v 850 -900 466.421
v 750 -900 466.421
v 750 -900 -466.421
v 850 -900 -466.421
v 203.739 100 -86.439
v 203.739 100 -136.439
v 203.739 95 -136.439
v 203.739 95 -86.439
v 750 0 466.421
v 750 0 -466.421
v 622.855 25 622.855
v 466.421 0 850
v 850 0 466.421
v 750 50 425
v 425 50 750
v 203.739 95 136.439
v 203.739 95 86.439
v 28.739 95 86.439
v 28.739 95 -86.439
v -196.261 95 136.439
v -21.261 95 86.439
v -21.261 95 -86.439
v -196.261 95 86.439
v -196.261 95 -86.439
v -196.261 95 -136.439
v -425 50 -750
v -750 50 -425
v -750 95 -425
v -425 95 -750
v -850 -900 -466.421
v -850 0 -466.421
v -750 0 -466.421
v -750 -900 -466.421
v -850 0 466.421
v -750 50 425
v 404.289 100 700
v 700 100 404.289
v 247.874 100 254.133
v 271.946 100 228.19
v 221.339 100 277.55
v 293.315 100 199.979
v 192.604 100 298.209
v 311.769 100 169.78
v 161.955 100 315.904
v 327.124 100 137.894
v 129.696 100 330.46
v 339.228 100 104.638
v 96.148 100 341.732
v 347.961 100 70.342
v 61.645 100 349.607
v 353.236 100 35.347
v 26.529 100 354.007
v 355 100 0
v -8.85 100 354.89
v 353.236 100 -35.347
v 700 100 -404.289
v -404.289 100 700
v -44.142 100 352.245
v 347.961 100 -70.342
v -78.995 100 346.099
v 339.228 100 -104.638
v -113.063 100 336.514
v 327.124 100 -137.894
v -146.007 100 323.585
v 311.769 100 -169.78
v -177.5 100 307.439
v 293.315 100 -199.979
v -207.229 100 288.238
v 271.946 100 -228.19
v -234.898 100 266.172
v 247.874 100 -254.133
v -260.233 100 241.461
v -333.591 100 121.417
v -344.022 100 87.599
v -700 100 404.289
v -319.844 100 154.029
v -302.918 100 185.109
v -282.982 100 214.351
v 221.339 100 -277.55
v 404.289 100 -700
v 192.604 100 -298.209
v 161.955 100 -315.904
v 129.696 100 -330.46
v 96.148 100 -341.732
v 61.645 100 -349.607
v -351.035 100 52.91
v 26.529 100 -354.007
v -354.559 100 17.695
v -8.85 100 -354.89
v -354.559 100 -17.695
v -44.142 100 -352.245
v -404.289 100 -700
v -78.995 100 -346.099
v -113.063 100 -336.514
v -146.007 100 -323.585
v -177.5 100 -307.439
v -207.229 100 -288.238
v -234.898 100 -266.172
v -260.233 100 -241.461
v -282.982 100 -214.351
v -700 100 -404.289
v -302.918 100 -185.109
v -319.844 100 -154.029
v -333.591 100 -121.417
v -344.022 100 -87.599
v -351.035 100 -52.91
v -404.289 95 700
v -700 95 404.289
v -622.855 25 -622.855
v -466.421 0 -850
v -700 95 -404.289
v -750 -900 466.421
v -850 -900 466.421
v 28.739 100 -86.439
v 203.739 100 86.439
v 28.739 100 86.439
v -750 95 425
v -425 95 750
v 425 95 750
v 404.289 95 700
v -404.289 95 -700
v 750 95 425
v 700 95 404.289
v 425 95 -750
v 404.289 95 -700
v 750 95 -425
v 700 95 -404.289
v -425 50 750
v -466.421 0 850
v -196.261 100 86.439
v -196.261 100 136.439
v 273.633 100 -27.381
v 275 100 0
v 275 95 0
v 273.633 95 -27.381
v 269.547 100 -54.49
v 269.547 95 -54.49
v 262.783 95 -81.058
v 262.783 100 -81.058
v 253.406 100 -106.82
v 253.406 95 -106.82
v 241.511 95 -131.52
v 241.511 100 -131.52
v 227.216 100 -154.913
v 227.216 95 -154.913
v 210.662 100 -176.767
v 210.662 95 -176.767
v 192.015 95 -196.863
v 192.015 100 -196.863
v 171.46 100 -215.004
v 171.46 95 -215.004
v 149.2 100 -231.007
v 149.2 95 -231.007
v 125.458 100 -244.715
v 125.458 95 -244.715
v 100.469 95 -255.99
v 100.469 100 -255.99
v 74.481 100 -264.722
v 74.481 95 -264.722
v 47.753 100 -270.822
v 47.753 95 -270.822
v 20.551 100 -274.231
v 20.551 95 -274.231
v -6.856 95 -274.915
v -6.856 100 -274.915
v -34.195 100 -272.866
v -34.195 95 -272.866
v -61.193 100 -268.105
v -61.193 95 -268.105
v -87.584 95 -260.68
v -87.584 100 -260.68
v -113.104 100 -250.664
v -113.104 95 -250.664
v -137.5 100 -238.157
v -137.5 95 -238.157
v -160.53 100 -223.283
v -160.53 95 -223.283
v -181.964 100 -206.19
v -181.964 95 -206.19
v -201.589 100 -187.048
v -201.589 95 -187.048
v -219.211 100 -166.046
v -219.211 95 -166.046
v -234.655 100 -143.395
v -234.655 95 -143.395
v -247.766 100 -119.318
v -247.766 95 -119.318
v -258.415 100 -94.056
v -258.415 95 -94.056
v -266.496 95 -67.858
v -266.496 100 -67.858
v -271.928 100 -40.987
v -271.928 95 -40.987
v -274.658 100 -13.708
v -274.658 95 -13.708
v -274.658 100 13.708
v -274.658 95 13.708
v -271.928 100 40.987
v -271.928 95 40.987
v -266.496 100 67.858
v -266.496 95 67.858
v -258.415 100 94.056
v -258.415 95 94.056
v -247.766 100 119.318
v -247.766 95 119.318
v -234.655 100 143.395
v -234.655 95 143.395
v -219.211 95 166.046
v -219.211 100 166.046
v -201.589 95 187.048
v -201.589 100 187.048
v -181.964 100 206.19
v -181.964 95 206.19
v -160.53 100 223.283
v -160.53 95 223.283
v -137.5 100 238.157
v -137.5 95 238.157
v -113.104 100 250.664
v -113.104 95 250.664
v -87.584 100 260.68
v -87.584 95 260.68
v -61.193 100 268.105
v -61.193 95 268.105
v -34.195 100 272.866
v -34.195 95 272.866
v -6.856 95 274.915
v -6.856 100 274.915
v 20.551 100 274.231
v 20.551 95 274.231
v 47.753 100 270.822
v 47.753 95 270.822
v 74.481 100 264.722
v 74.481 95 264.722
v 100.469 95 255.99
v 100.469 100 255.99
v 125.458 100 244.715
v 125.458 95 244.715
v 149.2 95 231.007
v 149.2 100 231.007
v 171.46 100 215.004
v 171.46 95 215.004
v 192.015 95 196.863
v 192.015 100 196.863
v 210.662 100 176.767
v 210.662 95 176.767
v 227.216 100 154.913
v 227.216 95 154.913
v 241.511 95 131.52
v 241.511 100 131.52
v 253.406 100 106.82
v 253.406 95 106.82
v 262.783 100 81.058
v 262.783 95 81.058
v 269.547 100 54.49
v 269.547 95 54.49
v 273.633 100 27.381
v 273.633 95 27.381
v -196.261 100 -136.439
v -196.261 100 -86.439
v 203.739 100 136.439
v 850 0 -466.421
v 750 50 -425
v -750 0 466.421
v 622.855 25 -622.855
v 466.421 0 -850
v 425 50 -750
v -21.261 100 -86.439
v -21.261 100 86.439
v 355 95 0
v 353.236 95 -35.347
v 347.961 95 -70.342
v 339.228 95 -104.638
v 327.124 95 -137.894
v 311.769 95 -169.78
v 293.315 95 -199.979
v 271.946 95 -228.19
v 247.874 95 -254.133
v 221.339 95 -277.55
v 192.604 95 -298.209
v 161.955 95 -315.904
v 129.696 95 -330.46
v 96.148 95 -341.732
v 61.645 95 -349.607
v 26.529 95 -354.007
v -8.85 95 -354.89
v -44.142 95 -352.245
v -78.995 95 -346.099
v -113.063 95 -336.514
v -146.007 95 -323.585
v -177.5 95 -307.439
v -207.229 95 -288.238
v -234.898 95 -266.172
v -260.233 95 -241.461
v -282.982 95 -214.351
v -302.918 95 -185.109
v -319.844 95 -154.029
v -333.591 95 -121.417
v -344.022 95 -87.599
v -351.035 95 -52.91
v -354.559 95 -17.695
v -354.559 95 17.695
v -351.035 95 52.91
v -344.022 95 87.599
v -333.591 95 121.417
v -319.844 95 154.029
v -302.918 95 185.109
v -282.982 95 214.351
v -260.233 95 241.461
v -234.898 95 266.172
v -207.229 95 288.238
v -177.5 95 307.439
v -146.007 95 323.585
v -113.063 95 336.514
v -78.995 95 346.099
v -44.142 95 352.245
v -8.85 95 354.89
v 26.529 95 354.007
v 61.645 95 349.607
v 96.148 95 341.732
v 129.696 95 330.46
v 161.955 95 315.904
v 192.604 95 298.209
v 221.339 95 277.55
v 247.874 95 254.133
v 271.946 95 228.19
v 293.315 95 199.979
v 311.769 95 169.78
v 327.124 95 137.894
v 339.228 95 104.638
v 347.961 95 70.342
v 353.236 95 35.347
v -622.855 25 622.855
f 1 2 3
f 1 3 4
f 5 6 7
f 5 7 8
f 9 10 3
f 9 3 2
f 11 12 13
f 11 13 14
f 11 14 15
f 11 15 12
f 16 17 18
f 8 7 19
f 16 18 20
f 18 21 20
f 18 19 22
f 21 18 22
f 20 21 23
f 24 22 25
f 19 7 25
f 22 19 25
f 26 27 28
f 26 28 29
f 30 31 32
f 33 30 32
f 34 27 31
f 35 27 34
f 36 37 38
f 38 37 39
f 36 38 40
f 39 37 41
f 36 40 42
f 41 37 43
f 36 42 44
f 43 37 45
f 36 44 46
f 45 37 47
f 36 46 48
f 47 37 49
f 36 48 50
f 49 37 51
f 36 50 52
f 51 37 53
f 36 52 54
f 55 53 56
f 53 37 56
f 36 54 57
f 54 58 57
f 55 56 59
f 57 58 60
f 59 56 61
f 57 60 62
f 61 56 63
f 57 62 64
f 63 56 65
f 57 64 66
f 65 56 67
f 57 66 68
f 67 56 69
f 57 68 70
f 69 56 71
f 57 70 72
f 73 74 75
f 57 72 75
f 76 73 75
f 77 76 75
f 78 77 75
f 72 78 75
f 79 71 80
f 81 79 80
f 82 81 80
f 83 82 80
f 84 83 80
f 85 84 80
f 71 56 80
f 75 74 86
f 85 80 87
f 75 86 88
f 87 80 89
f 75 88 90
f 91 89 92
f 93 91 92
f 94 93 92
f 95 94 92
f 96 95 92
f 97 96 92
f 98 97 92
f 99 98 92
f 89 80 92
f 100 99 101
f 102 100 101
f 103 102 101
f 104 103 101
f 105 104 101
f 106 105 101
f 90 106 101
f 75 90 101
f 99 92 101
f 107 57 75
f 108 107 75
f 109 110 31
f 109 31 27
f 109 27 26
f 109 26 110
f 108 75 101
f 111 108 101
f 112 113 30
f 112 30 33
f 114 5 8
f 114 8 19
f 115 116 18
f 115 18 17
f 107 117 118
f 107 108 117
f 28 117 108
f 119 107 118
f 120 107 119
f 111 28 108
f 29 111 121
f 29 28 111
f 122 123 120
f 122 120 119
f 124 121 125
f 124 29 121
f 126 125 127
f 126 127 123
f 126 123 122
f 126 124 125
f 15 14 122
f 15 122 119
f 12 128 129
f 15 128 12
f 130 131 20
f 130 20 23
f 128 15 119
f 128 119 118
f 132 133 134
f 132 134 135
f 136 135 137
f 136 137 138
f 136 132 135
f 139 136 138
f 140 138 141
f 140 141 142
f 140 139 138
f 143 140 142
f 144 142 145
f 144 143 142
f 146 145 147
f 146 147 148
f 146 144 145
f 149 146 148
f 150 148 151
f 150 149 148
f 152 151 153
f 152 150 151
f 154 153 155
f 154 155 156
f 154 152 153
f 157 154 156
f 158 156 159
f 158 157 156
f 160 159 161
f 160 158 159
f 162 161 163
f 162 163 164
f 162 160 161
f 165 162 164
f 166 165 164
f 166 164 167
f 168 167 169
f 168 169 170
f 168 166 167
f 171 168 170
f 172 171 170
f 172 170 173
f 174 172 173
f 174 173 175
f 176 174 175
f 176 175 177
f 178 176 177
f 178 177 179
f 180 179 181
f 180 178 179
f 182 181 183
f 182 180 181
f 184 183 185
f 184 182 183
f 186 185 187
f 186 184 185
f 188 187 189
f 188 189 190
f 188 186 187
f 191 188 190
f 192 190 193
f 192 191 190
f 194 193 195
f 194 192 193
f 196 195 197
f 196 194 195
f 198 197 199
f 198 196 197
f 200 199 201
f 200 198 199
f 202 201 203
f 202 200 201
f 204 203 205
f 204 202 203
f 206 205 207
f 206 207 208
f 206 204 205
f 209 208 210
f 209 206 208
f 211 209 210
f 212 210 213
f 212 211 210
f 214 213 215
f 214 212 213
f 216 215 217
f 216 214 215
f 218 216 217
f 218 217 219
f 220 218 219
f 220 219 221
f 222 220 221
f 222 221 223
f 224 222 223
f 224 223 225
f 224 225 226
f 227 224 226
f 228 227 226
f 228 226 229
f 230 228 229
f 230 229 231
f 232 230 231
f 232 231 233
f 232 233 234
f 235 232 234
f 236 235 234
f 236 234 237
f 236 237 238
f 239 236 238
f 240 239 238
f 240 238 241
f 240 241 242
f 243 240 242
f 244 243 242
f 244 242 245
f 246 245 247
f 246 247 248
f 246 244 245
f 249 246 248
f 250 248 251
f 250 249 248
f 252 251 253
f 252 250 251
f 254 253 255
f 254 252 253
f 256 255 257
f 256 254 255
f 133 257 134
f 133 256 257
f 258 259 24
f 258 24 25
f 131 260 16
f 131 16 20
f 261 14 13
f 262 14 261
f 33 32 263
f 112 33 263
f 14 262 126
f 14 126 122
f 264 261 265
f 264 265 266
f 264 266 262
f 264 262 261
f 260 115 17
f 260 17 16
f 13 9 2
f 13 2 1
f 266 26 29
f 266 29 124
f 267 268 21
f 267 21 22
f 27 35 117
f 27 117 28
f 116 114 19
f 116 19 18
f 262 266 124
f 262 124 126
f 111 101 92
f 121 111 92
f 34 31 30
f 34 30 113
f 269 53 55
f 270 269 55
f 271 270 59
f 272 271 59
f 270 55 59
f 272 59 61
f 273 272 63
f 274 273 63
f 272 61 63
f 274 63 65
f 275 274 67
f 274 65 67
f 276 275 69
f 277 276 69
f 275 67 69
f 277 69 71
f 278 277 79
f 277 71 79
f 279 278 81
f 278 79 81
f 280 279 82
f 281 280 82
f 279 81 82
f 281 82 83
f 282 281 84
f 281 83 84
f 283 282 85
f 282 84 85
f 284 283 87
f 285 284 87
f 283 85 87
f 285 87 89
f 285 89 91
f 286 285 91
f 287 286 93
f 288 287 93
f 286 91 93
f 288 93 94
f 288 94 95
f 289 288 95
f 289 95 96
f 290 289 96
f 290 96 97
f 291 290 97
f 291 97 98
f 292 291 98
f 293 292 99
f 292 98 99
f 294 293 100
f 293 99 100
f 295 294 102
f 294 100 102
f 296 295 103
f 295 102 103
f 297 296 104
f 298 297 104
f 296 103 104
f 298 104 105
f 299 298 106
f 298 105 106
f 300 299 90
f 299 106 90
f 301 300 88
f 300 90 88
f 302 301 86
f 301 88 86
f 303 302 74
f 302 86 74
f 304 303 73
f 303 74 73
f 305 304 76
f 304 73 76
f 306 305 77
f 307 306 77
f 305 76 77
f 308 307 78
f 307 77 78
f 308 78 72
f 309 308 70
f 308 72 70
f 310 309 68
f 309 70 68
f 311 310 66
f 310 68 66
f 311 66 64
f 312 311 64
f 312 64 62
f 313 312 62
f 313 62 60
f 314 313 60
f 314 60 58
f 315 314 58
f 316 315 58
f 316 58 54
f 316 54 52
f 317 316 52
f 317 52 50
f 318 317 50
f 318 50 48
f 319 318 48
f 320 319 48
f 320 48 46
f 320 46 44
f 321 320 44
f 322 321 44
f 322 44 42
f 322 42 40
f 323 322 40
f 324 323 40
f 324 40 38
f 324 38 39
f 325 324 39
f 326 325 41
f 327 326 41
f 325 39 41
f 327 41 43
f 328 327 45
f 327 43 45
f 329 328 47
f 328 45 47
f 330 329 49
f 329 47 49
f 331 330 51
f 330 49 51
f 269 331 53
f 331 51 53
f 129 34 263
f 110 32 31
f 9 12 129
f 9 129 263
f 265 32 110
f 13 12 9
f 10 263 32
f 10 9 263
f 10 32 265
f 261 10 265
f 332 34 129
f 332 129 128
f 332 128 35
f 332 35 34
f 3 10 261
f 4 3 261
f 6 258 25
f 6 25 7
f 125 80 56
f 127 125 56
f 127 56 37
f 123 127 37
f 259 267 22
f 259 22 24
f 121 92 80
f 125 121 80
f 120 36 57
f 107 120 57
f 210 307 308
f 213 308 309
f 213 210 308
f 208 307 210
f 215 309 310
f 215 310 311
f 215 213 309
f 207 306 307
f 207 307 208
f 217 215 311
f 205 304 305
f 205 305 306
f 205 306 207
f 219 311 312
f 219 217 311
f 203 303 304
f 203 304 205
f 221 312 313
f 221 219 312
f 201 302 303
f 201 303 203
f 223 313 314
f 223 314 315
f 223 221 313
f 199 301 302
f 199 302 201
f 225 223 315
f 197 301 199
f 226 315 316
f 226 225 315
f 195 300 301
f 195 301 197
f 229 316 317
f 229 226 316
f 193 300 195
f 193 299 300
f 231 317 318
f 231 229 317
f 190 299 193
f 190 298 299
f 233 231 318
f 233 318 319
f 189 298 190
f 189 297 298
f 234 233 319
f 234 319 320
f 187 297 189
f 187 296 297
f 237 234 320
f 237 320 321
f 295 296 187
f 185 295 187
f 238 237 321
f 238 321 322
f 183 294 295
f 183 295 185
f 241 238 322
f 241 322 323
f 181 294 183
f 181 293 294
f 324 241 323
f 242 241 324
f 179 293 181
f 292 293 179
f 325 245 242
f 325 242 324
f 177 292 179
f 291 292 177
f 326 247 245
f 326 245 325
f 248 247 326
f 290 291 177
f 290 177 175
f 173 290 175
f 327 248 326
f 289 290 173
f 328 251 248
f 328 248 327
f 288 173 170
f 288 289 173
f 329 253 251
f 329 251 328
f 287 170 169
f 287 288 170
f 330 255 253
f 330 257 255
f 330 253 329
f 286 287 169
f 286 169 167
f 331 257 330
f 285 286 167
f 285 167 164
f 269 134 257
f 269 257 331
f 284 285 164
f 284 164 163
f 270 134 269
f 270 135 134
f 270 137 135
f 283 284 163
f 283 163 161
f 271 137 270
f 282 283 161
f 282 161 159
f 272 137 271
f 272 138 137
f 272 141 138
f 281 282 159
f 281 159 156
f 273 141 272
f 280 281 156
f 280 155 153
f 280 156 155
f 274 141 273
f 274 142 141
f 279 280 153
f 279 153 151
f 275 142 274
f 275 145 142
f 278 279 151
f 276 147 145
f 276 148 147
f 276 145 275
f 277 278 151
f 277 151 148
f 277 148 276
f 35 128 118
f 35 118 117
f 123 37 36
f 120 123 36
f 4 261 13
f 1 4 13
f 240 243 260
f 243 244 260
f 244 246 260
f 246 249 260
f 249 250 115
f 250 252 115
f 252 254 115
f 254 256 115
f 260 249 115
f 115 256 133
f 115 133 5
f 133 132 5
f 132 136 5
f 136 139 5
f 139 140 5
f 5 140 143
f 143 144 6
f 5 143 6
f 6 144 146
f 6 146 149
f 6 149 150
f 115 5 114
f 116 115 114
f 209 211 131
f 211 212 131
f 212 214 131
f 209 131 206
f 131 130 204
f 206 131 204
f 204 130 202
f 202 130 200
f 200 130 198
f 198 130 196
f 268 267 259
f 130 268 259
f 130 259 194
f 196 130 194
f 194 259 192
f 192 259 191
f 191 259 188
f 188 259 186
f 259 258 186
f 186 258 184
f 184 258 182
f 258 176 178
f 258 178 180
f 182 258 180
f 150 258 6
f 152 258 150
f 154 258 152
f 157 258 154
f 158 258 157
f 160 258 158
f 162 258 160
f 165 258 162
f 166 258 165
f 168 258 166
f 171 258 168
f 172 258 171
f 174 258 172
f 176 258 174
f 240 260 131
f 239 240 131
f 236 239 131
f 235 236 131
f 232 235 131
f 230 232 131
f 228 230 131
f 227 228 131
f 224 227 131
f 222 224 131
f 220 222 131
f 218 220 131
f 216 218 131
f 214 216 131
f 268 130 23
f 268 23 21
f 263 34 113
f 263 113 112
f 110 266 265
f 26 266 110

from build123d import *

# Parameters (mm, degrees)
EXTRUDE_2_DEPTH     = 100
SKETCH_8_R          = 355
SKETCH_8_R_2        = 275
CUT_EXTRUDE_1_DEPTH = 5
CUT_EXTRUDE_2_DEPTH = 5
CUT_EXTRUDE_3_DEPTH = 5
SKETCH_13_W         = 100
SKETCH_13_H         = 932.842712474
EXTRUDE_3_DEPTH     = 900


with BuildPart() as part:
    # 草图2 → 凸台-拉伸2 (new body)
    with BuildSketch(Plane(origin=(0, 0, 0), x_dir=(1, 0, 0), z_dir=(0, 1, 0))):
        Polygon((-425, 750), (425, 750), (750, 425), (750, -425), (425, -750), (-425, -750), (-750, -425), (-750, 425), align=None)
    extrude(amount=EXTRUDE_2_DEPTH)

    # 草图4 → 放样4 section 0
    with BuildSketch(Plane.XZ):
        Polygon((-466.421356237, 850), (466.421356237, 850), (850, 466.421356237), (850, -466.421356237), (466.421356237, -850), (-466.421356237, -850), (-850, -466.421356237), (-850, 466.421356237), align=None)
    # 草图7 → 放样4 section 1
    with BuildSketch(Plane(origin=(0, 50, 0), x_dir=(1, 0, 0), z_dir=(0, 1, 0))):
        Polygon((750, -425), (425, -750), (-425, -750), (-750, -425), (-750, 425), (-425, 750), (425, 750), (750, 425), align=None)
    loft()

    # 草图8 → 切除-拉伸1 (cut)
    with BuildSketch(Plane(origin=(0, 100, 0), x_dir=(1, 0, 0), z_dir=(0, 1, 0))):
        Circle(SKETCH_8_R)
        Circle(SKETCH_8_R_2, mode=Mode.SUBTRACT)
    extrude(amount=-CUT_EXTRUDE_1_DEPTH, mode=Mode.SUBTRACT)

    # 草图9 → 切除-拉伸2 (cut)
    with BuildSketch(Plane(origin=(0, 100, 0), x_dir=(1, 0, 0), z_dir=(0, 1, 0))):
        Polygon((-196.260530097, 136.438578222), (203.739469903, 136.438578222), (203.739469903, 86.438578222), (28.739469903, 86.438578222), (28.739469903, -86.438578222), (203.739469903, -86.438578222), (203.739469903, -136.438578222), (-196.260530097, -136.438578222), (-196.260530097, -86.438578222), (-21.260530097, -86.438578222), (-21.260530097, 86.438578222), (-196.260530097, 86.438578222), align=None)
    extrude(amount=-CUT_EXTRUDE_2_DEPTH, mode=Mode.SUBTRACT)

    # 草图10 → 切除-拉伸3 (cut)
    with BuildSketch(Plane(origin=(0, 100, 0), x_dir=(1, 0, 0), z_dir=(0, 1, 0))):
        Polygon((425, 750), (-425, 750), (-750, 425), (-750, -425), (-425, -750), (425, -750), (750, -425), (750, 425), align=None)
        Polygon((700, 404.289321881), (700, -404.289321881), (404.289321881, -700), (-404.289321881, -700), (-700, -404.289321881), (-700, 404.289321881), (-404.289321881, 700), (404.289321881, 700), align=None, mode=Mode.SUBTRACT)
    extrude(amount=-CUT_EXTRUDE_3_DEPTH, mode=Mode.SUBTRACT)

    # 草图13 → 凸台-拉伸3 (add)
    with BuildSketch(Plane.XZ):
        with Locations((-800, 0)):
            Rectangle(SKETCH_13_W, SKETCH_13_H)
        with Locations((800, 0)):
            Rectangle(SKETCH_13_W, SKETCH_13_H)
    extrude(amount=EXTRUDE_3_DEPTH)


solid = part.part
